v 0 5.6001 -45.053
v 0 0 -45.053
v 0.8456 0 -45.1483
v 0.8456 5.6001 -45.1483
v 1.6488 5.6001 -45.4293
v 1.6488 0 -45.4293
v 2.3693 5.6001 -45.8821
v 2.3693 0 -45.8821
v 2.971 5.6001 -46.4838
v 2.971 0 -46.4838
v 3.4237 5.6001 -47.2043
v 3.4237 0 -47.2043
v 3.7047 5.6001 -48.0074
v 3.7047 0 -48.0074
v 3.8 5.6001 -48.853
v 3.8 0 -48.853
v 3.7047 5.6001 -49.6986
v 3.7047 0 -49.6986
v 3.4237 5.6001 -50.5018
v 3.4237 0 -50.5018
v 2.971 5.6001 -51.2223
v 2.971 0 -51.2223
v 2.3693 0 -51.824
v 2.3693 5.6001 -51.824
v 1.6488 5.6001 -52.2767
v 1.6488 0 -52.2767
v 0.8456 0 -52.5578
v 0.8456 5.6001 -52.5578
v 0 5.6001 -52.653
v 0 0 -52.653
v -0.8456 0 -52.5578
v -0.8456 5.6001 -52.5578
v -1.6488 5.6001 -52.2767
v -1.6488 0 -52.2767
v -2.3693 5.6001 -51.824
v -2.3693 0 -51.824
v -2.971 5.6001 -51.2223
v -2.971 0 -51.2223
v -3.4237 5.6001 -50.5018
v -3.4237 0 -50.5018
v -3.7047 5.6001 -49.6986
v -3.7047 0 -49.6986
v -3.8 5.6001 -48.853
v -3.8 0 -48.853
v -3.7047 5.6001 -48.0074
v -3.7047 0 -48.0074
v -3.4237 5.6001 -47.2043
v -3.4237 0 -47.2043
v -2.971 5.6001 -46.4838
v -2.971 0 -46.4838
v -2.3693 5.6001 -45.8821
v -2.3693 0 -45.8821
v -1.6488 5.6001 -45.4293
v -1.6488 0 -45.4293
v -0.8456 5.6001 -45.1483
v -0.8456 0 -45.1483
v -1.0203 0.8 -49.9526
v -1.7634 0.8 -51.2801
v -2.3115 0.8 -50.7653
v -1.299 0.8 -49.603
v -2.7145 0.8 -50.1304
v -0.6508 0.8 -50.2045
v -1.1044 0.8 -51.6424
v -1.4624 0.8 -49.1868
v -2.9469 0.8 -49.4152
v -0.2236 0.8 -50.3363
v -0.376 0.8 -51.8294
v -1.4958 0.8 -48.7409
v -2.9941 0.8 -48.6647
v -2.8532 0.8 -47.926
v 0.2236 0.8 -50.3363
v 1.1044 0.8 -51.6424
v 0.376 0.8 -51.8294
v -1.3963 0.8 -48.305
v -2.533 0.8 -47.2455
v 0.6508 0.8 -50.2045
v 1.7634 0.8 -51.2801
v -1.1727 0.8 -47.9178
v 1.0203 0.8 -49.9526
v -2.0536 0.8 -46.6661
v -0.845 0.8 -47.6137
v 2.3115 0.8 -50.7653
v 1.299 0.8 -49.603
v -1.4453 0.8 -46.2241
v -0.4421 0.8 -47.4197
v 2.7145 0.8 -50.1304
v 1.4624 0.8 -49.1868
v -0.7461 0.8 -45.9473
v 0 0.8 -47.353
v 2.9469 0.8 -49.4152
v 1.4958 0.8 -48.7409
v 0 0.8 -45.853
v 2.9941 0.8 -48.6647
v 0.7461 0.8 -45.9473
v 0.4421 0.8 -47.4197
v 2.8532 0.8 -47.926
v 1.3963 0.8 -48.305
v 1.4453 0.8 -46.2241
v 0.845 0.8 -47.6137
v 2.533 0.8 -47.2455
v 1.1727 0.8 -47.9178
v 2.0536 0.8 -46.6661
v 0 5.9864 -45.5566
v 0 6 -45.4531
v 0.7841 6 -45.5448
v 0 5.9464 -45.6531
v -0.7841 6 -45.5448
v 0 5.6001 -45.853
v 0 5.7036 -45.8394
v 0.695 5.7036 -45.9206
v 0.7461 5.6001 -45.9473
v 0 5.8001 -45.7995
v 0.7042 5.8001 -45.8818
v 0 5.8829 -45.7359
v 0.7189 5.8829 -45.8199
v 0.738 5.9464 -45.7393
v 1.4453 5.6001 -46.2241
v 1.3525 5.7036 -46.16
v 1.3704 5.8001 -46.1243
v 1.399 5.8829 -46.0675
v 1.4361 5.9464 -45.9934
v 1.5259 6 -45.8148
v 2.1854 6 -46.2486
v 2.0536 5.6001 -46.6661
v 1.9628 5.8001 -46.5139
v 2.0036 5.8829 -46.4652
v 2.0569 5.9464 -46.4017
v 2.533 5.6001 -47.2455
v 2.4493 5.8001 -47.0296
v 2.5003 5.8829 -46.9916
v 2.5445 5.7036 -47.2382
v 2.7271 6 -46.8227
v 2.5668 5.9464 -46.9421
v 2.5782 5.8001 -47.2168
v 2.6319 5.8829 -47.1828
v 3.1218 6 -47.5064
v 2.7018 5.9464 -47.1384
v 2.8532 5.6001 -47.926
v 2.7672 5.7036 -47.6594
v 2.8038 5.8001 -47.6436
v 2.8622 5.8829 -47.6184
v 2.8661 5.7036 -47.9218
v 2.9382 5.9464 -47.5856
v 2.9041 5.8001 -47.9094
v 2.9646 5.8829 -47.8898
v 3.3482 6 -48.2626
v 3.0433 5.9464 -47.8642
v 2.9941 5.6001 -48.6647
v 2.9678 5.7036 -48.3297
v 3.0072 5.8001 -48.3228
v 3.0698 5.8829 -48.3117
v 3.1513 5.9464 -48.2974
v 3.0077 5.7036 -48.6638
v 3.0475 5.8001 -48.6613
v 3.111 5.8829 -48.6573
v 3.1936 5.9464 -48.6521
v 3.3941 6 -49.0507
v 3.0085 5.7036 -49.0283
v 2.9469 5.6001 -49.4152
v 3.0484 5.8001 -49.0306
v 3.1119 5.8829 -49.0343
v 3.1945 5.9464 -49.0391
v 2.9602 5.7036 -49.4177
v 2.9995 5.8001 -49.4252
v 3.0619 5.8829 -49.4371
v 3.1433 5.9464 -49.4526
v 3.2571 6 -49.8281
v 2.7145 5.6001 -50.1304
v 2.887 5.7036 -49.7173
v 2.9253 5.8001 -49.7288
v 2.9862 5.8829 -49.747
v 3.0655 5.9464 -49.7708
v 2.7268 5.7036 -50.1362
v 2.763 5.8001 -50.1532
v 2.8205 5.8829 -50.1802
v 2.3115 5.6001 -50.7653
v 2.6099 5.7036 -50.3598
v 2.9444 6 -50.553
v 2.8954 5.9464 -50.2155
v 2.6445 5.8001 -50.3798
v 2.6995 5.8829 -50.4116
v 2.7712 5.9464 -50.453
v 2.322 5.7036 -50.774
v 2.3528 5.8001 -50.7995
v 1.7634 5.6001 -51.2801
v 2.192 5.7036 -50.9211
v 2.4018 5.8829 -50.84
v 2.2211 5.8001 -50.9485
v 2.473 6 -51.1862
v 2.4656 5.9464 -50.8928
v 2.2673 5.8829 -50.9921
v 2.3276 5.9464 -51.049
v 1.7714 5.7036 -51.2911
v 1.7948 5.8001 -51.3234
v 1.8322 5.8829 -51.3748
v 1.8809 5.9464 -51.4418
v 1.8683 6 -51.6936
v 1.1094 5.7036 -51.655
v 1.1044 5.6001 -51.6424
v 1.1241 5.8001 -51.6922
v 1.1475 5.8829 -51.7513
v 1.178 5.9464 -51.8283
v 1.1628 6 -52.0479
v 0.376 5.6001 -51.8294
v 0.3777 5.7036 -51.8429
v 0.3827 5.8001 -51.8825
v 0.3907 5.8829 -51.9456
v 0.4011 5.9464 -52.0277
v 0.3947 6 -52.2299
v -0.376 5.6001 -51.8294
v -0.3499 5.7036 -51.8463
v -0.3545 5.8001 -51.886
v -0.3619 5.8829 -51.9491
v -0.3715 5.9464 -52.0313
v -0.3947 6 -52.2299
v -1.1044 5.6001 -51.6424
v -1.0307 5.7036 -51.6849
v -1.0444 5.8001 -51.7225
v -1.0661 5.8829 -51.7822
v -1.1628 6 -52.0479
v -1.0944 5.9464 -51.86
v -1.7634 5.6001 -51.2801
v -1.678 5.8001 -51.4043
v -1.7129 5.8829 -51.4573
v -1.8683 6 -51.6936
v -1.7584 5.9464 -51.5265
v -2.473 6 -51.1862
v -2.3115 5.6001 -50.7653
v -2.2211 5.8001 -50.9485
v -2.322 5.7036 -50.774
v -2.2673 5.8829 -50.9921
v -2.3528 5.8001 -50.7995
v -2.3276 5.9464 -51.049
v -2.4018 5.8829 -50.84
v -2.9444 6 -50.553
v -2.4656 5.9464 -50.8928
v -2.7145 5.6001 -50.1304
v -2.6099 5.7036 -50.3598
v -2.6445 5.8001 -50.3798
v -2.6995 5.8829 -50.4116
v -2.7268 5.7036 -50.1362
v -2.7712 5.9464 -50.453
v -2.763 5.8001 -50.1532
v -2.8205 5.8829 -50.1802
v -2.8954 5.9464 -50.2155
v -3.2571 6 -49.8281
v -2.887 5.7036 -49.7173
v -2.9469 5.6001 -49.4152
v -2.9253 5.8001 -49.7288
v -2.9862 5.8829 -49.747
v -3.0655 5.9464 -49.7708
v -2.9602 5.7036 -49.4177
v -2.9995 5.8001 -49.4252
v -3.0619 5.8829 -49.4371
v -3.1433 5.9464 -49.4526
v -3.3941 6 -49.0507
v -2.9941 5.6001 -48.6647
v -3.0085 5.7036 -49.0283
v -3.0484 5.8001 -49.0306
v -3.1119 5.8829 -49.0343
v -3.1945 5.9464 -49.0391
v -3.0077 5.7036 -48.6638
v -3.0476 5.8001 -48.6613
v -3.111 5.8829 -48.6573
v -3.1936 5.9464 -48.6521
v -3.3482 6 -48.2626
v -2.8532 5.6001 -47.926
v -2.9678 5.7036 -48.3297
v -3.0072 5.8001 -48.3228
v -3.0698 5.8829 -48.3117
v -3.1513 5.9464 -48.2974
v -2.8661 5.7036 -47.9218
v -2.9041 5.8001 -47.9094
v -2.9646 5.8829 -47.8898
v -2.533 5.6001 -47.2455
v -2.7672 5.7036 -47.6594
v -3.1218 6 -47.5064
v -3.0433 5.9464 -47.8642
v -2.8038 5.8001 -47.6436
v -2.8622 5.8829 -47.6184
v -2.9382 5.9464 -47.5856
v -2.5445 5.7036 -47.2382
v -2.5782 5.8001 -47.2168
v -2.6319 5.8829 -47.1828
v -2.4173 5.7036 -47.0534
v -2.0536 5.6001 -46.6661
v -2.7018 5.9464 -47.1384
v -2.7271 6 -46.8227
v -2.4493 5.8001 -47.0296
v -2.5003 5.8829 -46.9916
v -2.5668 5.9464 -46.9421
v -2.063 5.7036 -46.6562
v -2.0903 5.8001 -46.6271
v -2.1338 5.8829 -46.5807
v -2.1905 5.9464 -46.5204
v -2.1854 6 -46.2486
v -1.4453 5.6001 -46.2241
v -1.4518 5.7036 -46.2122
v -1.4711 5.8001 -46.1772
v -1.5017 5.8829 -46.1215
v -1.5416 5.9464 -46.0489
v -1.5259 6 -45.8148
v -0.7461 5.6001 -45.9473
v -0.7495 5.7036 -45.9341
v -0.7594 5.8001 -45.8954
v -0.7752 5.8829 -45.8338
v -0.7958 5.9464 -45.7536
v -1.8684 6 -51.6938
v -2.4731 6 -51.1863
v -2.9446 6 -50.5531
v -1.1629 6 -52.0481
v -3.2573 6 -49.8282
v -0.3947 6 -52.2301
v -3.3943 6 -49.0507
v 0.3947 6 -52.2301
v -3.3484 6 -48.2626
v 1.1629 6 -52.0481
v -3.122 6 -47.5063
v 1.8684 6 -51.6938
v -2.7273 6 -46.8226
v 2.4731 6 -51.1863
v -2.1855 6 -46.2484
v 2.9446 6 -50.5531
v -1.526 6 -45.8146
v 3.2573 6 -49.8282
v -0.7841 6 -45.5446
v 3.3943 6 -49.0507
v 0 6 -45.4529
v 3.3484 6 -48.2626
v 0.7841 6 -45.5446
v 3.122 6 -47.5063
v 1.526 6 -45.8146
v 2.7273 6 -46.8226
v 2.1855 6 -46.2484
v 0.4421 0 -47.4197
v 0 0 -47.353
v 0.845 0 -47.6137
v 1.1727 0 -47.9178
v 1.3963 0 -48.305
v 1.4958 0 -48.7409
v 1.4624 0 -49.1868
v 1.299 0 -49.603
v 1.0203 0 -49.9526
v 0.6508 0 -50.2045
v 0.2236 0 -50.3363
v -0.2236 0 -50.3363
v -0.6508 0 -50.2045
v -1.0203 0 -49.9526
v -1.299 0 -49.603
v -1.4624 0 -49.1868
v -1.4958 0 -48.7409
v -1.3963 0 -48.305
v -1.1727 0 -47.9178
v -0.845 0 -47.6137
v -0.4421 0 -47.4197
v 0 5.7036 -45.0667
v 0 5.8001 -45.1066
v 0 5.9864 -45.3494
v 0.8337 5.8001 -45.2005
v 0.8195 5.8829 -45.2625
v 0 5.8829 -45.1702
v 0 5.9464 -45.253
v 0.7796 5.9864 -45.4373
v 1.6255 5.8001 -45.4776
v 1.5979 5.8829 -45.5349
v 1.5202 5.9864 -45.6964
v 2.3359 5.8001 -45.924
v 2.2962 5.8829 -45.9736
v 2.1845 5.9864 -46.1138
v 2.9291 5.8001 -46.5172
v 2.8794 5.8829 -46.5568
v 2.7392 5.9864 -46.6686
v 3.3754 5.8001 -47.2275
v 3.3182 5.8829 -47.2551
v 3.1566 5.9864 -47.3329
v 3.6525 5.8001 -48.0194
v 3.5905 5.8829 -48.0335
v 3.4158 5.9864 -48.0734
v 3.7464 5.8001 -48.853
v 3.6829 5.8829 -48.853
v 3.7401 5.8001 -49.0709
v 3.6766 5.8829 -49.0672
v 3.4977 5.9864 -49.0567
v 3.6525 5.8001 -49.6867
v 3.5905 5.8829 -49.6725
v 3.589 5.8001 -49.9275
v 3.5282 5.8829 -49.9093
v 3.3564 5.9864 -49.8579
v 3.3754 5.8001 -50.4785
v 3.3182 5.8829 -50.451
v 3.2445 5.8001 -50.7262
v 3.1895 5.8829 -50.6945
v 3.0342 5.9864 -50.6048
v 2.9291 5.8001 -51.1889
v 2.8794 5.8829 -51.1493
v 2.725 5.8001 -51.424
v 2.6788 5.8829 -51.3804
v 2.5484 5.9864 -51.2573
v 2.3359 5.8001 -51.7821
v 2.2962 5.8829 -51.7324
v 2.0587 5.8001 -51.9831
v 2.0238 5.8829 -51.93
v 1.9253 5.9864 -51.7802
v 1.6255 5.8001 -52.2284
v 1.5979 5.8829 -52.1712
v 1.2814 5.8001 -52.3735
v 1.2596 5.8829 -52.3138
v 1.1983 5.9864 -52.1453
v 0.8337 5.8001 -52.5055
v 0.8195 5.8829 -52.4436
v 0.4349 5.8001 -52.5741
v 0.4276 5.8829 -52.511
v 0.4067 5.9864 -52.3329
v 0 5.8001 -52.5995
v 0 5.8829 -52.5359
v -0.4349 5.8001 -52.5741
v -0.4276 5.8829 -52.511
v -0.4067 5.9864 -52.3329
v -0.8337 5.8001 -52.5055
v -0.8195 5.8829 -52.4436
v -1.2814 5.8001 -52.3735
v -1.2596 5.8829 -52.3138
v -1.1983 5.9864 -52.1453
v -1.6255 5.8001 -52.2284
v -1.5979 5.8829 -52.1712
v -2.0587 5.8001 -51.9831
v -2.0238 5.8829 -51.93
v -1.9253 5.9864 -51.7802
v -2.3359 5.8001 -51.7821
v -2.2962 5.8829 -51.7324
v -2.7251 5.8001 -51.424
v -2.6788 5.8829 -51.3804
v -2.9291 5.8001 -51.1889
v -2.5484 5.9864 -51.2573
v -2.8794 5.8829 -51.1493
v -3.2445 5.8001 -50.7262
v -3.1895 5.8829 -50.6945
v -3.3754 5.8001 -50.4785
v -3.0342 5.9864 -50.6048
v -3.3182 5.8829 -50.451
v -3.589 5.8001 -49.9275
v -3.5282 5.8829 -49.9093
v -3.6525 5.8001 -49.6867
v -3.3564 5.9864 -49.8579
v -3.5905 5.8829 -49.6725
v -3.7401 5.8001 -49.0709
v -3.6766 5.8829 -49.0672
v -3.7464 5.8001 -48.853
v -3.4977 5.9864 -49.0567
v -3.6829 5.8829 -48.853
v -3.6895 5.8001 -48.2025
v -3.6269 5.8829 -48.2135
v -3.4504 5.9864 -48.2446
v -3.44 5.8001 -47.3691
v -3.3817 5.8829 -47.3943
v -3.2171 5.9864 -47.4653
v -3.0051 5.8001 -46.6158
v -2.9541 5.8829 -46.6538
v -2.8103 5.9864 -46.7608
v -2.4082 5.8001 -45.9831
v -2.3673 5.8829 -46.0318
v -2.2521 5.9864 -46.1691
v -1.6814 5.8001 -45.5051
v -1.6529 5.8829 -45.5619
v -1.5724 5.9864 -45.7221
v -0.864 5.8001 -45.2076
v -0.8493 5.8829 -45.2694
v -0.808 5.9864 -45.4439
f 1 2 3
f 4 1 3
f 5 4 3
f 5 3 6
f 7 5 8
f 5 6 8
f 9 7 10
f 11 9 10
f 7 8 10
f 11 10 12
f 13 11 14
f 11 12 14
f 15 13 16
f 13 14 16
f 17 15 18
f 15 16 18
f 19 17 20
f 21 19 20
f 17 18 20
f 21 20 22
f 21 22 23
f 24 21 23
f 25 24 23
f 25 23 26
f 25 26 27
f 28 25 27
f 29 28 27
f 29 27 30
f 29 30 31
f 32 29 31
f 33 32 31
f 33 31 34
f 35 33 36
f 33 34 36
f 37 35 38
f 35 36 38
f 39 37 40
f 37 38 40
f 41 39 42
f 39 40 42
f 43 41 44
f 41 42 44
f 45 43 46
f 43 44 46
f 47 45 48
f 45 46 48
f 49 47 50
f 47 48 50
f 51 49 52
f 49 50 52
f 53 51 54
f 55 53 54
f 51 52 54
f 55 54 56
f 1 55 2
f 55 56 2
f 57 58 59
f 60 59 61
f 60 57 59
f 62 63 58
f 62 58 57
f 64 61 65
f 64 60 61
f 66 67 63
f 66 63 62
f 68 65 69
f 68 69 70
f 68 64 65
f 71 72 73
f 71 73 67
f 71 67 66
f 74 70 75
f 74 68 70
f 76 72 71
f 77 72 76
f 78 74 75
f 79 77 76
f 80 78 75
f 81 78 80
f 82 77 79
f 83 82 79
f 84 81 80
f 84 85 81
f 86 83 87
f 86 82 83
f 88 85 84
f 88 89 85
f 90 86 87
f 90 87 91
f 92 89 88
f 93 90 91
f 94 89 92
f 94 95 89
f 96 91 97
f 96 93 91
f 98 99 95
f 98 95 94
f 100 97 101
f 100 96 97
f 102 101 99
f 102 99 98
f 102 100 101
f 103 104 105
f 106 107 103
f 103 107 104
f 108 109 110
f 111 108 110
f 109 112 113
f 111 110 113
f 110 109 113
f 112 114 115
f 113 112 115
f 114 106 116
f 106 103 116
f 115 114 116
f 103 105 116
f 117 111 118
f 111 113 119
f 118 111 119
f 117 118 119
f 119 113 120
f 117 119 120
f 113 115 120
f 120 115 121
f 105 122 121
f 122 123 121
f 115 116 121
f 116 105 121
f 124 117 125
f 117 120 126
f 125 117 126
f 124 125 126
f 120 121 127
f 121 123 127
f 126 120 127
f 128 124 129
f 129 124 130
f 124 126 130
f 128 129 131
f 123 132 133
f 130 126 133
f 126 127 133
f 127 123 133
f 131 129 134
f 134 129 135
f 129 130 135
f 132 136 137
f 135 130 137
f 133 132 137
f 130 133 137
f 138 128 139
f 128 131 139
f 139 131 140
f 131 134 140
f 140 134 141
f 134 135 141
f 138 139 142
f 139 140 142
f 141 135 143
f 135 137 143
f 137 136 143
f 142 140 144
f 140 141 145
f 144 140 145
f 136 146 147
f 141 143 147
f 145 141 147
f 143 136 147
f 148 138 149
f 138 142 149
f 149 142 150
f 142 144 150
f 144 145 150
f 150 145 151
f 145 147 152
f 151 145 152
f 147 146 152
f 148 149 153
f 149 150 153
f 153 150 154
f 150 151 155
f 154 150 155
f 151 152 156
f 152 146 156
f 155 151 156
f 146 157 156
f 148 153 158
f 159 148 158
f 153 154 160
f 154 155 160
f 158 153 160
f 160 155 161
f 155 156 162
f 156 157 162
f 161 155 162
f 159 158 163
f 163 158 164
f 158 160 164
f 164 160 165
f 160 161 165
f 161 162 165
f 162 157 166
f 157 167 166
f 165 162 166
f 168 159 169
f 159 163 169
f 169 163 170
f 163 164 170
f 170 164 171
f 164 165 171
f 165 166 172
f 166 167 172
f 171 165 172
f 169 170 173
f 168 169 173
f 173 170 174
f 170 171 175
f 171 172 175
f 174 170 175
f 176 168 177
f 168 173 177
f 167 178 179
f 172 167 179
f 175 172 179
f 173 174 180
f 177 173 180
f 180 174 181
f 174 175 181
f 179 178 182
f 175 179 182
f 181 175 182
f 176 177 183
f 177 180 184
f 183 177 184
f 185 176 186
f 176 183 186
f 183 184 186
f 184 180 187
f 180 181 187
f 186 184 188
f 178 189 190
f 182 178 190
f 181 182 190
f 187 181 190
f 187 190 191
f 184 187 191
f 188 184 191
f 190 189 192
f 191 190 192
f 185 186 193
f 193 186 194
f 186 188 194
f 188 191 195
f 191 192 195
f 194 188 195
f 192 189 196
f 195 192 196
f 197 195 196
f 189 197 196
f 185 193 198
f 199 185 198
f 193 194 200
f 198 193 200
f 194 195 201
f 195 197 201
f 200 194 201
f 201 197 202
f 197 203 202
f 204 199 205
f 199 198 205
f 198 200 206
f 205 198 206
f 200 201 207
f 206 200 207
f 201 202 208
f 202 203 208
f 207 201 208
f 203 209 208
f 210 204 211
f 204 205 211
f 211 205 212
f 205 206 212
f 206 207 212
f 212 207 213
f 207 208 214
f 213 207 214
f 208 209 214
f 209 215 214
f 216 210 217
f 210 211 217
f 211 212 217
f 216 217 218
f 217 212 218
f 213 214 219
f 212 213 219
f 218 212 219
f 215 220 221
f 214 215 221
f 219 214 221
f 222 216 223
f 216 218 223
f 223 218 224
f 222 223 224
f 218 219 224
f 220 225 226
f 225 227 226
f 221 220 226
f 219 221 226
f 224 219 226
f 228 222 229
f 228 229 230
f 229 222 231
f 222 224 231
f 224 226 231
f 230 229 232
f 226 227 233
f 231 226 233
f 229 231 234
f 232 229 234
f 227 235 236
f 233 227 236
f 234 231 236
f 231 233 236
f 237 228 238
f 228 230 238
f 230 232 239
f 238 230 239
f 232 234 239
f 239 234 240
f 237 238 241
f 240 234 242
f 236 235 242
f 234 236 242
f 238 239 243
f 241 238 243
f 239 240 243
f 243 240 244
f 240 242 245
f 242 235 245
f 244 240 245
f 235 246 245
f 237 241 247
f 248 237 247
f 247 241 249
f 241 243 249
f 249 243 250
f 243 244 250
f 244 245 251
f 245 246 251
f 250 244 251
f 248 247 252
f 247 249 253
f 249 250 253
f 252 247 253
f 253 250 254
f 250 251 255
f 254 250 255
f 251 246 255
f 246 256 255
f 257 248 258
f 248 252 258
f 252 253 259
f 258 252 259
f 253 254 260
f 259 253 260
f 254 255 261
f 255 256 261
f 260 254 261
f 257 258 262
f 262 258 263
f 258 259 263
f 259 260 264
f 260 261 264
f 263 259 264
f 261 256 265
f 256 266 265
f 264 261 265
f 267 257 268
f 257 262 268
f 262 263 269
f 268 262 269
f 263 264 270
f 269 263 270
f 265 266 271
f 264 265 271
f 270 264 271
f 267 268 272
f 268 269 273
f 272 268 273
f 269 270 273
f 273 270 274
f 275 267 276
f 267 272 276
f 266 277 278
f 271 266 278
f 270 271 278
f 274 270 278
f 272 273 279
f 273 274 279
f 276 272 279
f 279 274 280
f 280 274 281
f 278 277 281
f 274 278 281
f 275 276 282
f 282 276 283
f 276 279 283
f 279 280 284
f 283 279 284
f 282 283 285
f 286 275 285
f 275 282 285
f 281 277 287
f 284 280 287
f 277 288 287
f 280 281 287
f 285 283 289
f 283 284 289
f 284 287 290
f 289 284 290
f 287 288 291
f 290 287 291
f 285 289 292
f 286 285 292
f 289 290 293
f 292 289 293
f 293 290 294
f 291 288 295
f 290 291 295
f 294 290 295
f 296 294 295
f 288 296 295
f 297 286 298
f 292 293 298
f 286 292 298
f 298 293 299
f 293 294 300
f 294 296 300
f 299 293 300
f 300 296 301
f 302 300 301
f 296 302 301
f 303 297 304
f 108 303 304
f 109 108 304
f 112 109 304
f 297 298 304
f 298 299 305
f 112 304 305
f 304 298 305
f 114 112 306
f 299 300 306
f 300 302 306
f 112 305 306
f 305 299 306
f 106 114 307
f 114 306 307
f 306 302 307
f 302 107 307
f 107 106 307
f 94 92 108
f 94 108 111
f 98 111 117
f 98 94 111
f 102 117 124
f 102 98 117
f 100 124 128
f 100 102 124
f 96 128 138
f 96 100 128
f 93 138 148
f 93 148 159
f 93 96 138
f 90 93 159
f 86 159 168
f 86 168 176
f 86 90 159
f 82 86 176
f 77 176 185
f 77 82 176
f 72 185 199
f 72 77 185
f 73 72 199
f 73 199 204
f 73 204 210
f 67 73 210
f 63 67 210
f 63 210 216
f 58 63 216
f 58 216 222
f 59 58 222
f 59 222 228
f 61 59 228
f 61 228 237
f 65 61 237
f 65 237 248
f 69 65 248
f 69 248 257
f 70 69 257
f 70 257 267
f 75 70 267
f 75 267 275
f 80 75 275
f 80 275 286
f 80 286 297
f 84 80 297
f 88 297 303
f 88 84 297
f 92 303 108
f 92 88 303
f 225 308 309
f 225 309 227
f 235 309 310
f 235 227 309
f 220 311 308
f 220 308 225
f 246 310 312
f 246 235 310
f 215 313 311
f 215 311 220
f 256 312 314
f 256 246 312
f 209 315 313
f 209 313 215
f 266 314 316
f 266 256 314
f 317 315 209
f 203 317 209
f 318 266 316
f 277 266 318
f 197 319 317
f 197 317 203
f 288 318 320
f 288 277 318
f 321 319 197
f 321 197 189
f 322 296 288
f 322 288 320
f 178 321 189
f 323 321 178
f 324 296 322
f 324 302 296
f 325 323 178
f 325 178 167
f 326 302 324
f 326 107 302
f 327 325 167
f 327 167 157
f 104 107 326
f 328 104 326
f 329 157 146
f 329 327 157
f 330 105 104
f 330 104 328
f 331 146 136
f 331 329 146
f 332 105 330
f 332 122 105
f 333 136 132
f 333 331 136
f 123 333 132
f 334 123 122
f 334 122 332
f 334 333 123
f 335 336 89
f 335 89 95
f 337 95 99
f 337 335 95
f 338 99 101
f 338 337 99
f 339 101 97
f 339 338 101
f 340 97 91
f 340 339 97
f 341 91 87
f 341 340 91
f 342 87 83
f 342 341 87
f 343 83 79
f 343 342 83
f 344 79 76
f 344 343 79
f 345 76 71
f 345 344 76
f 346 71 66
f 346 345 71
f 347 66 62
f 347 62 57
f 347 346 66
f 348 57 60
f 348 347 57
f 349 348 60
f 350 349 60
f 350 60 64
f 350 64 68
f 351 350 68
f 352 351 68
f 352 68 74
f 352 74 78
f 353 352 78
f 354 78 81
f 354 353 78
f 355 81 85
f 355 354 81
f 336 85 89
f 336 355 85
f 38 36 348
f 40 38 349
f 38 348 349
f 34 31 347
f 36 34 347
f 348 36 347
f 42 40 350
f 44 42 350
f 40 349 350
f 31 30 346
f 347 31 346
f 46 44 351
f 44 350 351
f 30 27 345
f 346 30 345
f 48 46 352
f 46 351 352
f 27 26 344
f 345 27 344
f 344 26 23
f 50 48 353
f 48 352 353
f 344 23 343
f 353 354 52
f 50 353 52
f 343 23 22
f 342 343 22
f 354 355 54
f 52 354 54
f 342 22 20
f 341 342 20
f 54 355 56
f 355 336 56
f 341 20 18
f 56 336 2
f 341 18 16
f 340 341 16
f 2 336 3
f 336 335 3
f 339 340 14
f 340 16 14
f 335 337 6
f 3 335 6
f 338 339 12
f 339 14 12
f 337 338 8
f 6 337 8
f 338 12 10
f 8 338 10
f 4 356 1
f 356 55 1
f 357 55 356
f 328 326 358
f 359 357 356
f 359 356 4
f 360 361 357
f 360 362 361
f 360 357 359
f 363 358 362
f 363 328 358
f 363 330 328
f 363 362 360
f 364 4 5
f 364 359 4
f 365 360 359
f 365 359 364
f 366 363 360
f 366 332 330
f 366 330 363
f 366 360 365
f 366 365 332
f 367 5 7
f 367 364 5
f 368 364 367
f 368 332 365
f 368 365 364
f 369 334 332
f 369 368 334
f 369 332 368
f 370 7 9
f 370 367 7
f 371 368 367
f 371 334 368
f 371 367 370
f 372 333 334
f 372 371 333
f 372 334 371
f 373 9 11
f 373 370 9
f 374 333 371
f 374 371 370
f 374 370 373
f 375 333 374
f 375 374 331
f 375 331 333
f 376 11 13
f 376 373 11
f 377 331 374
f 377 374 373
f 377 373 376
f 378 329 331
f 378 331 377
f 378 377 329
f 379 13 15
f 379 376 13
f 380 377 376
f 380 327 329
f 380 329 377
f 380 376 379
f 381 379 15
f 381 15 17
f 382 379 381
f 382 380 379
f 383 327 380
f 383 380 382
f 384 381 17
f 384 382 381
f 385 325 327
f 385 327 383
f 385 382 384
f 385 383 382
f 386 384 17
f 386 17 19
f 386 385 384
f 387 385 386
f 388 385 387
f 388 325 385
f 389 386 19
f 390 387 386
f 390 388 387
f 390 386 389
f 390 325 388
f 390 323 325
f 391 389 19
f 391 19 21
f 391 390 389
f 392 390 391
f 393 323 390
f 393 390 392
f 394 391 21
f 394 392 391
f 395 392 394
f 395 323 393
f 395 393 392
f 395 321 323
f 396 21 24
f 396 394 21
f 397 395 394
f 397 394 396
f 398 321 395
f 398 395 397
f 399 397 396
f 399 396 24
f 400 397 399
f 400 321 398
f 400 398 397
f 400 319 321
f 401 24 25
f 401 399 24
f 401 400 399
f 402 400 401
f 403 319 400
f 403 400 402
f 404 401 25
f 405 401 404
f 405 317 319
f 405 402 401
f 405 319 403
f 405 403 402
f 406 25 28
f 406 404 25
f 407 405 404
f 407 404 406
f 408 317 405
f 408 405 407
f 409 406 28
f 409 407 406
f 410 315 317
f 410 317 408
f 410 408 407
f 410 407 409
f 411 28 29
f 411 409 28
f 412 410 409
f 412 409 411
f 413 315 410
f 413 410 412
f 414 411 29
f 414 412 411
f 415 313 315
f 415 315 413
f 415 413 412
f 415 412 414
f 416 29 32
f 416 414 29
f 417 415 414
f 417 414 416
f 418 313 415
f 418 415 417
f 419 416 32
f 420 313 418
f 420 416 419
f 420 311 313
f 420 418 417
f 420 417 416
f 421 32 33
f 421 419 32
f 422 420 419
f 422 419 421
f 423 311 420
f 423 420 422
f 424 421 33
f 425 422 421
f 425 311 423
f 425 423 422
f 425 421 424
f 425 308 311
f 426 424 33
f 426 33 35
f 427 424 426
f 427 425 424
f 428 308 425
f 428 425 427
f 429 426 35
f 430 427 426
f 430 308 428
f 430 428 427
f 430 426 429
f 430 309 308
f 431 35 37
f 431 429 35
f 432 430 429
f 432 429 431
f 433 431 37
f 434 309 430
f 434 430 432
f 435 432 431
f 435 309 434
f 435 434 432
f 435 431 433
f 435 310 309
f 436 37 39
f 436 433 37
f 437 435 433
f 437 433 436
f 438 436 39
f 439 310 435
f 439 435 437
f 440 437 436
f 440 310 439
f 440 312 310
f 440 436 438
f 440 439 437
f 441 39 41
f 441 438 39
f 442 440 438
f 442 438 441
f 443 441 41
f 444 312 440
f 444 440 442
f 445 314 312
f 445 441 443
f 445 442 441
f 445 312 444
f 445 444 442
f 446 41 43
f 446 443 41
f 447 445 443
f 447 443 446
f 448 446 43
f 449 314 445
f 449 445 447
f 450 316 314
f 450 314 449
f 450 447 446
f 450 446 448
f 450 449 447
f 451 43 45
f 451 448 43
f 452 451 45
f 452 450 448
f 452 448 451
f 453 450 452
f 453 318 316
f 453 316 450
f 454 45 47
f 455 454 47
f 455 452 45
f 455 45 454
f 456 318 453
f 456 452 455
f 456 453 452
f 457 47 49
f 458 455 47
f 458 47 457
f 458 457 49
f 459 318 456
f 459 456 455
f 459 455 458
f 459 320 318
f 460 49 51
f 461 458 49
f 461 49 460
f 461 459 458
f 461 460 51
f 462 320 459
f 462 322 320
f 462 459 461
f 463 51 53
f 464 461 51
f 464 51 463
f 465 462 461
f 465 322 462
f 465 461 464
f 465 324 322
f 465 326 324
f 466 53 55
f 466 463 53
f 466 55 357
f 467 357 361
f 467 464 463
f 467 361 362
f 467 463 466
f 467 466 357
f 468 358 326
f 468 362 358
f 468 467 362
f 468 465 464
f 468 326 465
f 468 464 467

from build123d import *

# Parameters (mm, degrees)
SKETCH_1_R      = 3.8
SKETCH_1_R_2    = 3
EXTRUDE_1_DEPTH = 6
SKETCH_1_13_R   = 3
SKETCH_1_13_R_2 = 1.5
EXTRUDE_2_DEPTH = 0.8
FILLET_1_R      = 0.4


with BuildPart() as part:
    # 草图1 → 凸台-拉伸1 (new body)
    with BuildSketch(Plane(origin=(0, 0, 0), x_dir=(1, 0, 0), z_dir=(0, 1, 0))):
        with Locations(Location((-1.835e-06, 48.853027267, 0), (0, 0, 270))):
            Circle(SKETCH_1_R)
        with Locations(Location((-1.835e-06, 48.853027267, 0), (0, 0, 270))):
            Circle(SKETCH_1_R_2, mode=Mode.SUBTRACT)
    extrude(amount=EXTRUDE_1_DEPTH)

    # 草图1<13> → 凸台-拉伸2 (add)
    with BuildSketch(Plane(origin=(0, 0, 0), x_dir=(1, 0, 0), z_dir=(0, 1, 0))):
        with Locations(Location((-1.835e-06, 48.853027267, 0), (0, 0, 270))):
            Circle(SKETCH_1_13_R)
        with Locations(Location((-1.835e-06, 48.853027267, 0), (0, 0, 270))):
            Circle(SKETCH_1_13_R_2, mode=Mode.SUBTRACT)
    extrude(amount=EXTRUDE_2_DEPTH)

    # 圆角1
    fillet_1_edges = [part.edges().sort_by_distance(p)[0] for p in [
        (-1.835e-06, 6, -52.653027267),
        (-1.835e-06, 6, -51.853027267),
    ]]
    fillet(fillet_1_edges, radius=FILLET_1_R - 0.0001)  # a hair under: the kernel refuses the full size


solid = part.part
